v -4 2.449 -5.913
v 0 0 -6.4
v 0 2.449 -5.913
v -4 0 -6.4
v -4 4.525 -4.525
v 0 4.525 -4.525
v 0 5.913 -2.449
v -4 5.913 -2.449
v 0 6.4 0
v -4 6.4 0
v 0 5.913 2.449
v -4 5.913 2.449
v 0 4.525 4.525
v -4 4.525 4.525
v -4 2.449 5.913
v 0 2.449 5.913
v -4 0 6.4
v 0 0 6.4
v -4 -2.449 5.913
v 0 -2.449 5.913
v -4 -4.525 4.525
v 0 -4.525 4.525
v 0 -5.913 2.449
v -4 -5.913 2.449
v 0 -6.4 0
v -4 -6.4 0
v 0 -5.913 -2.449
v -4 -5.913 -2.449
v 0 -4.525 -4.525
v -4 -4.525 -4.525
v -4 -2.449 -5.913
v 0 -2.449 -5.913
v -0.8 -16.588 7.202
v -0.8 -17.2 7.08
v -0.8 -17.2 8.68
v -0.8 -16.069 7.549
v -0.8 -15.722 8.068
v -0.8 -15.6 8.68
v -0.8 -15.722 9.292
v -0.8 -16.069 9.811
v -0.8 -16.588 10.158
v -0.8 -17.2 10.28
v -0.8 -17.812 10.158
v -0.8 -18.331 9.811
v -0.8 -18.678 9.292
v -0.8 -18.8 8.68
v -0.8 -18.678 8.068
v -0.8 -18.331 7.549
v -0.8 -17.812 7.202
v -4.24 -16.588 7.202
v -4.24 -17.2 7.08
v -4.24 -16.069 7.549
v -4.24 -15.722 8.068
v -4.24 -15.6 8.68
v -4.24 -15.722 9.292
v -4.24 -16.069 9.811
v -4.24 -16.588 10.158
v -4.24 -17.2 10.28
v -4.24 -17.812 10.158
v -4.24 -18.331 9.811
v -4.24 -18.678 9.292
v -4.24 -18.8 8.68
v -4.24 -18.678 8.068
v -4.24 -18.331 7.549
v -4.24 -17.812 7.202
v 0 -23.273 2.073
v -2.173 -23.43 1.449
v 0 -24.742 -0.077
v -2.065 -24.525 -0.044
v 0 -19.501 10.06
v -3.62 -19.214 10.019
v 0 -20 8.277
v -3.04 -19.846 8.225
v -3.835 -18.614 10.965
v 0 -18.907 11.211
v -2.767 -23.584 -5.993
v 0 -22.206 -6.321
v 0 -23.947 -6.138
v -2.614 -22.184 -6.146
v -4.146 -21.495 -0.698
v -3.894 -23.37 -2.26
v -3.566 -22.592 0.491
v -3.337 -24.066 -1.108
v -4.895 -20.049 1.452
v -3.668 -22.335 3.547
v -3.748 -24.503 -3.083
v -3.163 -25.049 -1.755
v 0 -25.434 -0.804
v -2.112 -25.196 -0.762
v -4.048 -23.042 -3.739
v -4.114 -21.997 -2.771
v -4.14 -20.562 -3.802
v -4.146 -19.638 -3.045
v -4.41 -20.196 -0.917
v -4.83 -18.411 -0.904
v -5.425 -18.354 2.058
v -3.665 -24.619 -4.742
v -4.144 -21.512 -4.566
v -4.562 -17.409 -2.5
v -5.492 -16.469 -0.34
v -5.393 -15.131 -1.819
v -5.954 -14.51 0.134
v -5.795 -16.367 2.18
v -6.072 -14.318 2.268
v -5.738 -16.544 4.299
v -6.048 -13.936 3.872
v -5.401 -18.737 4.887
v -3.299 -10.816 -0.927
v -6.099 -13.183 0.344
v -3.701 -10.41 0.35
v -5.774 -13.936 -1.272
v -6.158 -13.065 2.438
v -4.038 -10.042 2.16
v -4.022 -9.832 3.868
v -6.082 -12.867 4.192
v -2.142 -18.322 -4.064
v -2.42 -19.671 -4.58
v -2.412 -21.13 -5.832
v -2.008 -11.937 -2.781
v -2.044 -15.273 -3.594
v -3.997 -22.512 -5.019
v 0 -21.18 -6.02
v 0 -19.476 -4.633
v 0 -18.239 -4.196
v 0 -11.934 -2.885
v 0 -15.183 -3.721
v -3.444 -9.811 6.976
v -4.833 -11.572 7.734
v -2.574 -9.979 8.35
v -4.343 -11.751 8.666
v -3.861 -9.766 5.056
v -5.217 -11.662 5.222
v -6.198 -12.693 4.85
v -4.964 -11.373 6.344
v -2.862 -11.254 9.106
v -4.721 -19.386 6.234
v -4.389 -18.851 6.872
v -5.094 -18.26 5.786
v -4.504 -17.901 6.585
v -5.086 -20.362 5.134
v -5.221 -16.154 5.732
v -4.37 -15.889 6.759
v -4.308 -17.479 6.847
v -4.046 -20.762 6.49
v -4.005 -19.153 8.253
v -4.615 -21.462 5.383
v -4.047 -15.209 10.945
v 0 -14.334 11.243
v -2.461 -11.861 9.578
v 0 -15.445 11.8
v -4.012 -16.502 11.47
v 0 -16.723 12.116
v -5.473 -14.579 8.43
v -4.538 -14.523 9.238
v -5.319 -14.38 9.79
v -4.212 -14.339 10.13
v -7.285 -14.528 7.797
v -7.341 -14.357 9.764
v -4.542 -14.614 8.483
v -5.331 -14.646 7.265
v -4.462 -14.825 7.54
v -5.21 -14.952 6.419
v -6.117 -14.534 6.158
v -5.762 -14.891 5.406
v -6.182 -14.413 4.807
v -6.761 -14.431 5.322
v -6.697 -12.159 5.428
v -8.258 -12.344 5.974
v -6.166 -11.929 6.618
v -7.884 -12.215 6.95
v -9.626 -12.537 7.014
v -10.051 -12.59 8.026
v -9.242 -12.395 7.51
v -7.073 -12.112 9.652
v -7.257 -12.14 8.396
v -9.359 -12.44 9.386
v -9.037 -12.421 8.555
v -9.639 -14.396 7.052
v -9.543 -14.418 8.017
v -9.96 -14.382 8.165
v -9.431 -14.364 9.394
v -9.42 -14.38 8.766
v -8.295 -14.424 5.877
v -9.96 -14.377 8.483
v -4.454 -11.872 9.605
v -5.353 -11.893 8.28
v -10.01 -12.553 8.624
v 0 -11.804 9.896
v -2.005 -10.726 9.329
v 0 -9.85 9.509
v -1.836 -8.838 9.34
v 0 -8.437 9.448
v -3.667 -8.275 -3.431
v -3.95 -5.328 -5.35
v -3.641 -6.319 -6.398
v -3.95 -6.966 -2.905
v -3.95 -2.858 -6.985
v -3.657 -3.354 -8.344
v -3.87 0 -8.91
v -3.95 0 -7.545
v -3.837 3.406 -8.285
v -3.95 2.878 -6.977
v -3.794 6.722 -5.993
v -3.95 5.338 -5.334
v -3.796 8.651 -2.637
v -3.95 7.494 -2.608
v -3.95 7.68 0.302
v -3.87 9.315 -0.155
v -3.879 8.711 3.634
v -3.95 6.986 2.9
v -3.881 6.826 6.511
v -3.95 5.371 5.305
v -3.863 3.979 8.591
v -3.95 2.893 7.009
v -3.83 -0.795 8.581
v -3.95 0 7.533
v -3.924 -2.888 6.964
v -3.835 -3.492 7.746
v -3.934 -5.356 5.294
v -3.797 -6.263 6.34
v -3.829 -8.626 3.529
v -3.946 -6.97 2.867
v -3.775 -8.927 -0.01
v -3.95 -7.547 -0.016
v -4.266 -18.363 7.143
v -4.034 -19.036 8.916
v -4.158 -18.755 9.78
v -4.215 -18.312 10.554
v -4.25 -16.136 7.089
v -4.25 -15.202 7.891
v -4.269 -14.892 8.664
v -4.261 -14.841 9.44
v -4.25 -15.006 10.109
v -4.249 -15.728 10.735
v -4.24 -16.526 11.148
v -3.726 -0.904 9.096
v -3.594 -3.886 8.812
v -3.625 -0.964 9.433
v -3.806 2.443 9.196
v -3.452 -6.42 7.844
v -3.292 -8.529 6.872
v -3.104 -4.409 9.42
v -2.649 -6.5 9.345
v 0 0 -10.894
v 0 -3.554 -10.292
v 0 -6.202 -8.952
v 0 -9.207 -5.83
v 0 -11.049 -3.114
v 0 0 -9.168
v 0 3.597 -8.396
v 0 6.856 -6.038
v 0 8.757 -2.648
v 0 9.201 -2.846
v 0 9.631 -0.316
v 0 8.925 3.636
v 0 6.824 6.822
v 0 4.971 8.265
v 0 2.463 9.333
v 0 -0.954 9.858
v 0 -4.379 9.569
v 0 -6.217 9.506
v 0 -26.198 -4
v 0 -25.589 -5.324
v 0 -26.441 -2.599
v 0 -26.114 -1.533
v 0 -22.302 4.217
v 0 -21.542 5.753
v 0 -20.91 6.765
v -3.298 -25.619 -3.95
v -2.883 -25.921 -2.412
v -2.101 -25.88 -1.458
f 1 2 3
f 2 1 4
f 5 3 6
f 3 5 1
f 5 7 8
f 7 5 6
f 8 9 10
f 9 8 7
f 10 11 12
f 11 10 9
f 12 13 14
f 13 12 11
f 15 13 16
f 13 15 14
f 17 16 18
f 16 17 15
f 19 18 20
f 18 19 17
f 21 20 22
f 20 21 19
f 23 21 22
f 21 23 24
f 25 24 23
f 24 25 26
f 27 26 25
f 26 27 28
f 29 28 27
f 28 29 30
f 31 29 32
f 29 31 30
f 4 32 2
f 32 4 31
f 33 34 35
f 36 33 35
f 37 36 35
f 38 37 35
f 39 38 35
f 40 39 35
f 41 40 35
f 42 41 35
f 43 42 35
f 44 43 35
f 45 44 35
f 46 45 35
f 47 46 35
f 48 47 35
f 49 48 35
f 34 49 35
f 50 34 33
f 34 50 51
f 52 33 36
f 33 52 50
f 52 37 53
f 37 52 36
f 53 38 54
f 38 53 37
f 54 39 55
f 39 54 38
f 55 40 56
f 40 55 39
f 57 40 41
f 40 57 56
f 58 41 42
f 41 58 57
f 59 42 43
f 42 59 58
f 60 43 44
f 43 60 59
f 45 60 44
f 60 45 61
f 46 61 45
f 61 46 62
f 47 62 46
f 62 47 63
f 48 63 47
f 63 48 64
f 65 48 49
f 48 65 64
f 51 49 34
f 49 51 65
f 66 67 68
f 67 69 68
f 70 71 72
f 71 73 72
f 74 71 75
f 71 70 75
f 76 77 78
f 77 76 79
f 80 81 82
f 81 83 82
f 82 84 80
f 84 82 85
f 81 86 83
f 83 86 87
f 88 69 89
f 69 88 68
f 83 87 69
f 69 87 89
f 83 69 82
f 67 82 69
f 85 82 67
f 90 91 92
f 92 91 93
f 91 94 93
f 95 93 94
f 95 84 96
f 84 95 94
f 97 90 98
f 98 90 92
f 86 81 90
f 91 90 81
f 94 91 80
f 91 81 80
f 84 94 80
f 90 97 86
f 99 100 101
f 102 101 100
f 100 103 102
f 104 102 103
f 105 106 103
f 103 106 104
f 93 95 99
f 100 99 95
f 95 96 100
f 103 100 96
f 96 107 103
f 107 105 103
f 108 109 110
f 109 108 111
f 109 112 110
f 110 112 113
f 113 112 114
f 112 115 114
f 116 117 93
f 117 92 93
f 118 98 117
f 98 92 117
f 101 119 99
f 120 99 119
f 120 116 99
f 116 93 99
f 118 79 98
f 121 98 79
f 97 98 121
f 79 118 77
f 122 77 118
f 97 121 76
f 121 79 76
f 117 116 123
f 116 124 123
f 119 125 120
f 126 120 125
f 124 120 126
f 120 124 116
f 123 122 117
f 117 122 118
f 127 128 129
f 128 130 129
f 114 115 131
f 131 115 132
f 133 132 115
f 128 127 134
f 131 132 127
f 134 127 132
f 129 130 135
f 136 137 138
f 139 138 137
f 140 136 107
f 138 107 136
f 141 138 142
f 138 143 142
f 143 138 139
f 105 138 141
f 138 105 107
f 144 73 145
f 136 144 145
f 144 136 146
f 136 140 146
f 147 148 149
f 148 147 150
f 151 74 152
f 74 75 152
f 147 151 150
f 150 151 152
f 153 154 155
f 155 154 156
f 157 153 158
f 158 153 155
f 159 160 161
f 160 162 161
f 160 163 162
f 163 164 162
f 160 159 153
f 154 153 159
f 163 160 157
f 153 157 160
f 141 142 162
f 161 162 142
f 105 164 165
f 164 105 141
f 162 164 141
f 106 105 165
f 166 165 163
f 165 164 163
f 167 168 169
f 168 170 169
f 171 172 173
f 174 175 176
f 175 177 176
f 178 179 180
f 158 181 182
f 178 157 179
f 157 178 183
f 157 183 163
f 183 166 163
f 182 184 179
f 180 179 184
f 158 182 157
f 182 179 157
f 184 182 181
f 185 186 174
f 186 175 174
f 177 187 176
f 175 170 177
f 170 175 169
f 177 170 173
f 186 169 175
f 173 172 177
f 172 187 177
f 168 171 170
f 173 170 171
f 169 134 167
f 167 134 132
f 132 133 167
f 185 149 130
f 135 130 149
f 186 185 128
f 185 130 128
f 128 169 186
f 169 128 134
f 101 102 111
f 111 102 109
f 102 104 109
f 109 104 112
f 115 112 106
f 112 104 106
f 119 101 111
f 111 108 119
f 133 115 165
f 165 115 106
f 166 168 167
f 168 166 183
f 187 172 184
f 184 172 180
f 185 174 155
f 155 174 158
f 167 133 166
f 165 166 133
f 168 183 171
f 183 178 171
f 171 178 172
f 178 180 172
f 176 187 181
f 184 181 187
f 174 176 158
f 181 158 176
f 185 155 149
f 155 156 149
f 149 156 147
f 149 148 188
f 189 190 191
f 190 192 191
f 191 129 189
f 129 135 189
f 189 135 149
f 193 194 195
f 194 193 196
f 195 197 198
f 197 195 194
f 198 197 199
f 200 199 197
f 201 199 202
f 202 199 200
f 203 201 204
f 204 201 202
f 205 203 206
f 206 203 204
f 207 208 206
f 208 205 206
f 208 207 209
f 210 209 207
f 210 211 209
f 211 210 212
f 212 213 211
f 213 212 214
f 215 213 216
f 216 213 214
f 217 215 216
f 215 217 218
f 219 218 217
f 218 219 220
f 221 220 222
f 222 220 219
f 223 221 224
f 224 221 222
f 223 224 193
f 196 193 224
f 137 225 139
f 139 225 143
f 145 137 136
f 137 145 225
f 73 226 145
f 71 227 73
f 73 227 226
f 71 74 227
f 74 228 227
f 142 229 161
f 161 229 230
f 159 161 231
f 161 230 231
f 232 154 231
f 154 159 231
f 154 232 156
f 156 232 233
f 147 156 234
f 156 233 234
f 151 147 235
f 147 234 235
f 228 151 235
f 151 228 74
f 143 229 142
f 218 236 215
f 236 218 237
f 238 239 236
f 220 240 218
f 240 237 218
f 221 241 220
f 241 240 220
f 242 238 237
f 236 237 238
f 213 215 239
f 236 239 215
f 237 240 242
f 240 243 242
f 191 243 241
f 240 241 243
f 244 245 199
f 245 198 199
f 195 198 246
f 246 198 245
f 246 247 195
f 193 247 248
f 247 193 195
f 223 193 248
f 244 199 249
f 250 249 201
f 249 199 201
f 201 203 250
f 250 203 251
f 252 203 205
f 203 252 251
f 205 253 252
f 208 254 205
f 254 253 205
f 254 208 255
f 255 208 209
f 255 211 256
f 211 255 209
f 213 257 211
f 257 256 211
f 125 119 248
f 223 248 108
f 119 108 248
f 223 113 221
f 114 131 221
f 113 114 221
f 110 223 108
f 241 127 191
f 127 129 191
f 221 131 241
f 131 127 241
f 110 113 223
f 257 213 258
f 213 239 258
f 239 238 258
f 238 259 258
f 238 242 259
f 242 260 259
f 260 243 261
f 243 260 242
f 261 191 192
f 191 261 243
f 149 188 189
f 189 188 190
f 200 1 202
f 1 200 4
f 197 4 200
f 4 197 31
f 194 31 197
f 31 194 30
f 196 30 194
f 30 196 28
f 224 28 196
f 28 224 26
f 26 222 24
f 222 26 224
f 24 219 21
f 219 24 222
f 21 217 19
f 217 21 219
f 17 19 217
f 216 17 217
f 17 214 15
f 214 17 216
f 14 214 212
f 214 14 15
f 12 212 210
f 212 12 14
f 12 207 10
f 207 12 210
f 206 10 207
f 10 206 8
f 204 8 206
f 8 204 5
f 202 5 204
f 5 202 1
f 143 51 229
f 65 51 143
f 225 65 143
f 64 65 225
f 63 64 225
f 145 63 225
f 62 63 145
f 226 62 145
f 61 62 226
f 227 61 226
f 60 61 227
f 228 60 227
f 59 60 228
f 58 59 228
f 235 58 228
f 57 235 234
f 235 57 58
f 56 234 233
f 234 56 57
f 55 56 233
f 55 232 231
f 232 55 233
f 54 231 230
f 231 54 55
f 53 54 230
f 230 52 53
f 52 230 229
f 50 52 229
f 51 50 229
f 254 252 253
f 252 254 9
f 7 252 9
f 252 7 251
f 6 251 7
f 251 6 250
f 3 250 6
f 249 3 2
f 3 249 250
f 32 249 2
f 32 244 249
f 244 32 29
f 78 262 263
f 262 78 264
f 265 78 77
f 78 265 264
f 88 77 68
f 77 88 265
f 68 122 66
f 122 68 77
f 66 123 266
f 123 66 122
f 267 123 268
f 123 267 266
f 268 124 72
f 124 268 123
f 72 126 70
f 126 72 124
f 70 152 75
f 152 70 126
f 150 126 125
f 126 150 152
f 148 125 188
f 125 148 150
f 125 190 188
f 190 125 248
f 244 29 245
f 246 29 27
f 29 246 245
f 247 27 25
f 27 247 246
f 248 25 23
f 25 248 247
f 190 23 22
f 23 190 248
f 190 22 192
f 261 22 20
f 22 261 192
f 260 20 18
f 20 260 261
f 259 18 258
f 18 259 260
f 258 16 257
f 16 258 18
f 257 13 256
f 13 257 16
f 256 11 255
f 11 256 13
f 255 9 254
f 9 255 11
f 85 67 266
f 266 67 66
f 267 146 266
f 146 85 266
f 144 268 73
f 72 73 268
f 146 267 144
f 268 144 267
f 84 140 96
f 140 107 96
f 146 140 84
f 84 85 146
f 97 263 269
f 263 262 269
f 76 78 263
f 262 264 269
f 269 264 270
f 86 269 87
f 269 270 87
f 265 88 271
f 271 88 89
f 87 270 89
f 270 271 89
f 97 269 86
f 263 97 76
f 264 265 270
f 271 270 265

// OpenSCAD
use <../lib.scad>
use <64835.scad>
$fa=1; $fs=0.2;
function ldraw_lib__64780(realsolid=false) = [
// 0 ~Animal Cow Head Right
// 0 Name: 64780.dat
// 0 Author: Philippe Hurbain [Philo]
// 0 !LDRAW_ORG Part UPDATE 2015-01
// 0 !LICENSE Licensed under CC BY 2.0 and CC BY 4.0 : see CAreadme.txt
// 
// 0 BFC CERTIFY CCW
  [0,"BFC","CERTIFY"],
  [0,"BFC","CCW"],
// 
// 0 !HISTORY 2013-12-19 {LEGO Digital Designer} Original part shape
// 0 !HISTORY 2013-12-19 [Philo] File preparation for LDraw Parts Tracker
// 0 !HISTORY 2015-10-11 [PTadmin] Official Update 2015-01
// 
// 
// 1 16 0 0 0 -1 0 0 0 1 0 0 0 1 64835.dat
  [1,16,0,0,0,-1,0,0,0,1,0,0,0,1, ldraw_lib__64835(realsolid)],
];
module ldraw_lib__64780(step=0, col=false, unit=2/5, alt=false, line=0.2, solid=!$preview)
    makepoly(ldraw_lib__64780(solid), step=step, col=col, unit=unit, alt=alt, line=line, solid=solid);
ldraw_lib__64780(line=0.2);
